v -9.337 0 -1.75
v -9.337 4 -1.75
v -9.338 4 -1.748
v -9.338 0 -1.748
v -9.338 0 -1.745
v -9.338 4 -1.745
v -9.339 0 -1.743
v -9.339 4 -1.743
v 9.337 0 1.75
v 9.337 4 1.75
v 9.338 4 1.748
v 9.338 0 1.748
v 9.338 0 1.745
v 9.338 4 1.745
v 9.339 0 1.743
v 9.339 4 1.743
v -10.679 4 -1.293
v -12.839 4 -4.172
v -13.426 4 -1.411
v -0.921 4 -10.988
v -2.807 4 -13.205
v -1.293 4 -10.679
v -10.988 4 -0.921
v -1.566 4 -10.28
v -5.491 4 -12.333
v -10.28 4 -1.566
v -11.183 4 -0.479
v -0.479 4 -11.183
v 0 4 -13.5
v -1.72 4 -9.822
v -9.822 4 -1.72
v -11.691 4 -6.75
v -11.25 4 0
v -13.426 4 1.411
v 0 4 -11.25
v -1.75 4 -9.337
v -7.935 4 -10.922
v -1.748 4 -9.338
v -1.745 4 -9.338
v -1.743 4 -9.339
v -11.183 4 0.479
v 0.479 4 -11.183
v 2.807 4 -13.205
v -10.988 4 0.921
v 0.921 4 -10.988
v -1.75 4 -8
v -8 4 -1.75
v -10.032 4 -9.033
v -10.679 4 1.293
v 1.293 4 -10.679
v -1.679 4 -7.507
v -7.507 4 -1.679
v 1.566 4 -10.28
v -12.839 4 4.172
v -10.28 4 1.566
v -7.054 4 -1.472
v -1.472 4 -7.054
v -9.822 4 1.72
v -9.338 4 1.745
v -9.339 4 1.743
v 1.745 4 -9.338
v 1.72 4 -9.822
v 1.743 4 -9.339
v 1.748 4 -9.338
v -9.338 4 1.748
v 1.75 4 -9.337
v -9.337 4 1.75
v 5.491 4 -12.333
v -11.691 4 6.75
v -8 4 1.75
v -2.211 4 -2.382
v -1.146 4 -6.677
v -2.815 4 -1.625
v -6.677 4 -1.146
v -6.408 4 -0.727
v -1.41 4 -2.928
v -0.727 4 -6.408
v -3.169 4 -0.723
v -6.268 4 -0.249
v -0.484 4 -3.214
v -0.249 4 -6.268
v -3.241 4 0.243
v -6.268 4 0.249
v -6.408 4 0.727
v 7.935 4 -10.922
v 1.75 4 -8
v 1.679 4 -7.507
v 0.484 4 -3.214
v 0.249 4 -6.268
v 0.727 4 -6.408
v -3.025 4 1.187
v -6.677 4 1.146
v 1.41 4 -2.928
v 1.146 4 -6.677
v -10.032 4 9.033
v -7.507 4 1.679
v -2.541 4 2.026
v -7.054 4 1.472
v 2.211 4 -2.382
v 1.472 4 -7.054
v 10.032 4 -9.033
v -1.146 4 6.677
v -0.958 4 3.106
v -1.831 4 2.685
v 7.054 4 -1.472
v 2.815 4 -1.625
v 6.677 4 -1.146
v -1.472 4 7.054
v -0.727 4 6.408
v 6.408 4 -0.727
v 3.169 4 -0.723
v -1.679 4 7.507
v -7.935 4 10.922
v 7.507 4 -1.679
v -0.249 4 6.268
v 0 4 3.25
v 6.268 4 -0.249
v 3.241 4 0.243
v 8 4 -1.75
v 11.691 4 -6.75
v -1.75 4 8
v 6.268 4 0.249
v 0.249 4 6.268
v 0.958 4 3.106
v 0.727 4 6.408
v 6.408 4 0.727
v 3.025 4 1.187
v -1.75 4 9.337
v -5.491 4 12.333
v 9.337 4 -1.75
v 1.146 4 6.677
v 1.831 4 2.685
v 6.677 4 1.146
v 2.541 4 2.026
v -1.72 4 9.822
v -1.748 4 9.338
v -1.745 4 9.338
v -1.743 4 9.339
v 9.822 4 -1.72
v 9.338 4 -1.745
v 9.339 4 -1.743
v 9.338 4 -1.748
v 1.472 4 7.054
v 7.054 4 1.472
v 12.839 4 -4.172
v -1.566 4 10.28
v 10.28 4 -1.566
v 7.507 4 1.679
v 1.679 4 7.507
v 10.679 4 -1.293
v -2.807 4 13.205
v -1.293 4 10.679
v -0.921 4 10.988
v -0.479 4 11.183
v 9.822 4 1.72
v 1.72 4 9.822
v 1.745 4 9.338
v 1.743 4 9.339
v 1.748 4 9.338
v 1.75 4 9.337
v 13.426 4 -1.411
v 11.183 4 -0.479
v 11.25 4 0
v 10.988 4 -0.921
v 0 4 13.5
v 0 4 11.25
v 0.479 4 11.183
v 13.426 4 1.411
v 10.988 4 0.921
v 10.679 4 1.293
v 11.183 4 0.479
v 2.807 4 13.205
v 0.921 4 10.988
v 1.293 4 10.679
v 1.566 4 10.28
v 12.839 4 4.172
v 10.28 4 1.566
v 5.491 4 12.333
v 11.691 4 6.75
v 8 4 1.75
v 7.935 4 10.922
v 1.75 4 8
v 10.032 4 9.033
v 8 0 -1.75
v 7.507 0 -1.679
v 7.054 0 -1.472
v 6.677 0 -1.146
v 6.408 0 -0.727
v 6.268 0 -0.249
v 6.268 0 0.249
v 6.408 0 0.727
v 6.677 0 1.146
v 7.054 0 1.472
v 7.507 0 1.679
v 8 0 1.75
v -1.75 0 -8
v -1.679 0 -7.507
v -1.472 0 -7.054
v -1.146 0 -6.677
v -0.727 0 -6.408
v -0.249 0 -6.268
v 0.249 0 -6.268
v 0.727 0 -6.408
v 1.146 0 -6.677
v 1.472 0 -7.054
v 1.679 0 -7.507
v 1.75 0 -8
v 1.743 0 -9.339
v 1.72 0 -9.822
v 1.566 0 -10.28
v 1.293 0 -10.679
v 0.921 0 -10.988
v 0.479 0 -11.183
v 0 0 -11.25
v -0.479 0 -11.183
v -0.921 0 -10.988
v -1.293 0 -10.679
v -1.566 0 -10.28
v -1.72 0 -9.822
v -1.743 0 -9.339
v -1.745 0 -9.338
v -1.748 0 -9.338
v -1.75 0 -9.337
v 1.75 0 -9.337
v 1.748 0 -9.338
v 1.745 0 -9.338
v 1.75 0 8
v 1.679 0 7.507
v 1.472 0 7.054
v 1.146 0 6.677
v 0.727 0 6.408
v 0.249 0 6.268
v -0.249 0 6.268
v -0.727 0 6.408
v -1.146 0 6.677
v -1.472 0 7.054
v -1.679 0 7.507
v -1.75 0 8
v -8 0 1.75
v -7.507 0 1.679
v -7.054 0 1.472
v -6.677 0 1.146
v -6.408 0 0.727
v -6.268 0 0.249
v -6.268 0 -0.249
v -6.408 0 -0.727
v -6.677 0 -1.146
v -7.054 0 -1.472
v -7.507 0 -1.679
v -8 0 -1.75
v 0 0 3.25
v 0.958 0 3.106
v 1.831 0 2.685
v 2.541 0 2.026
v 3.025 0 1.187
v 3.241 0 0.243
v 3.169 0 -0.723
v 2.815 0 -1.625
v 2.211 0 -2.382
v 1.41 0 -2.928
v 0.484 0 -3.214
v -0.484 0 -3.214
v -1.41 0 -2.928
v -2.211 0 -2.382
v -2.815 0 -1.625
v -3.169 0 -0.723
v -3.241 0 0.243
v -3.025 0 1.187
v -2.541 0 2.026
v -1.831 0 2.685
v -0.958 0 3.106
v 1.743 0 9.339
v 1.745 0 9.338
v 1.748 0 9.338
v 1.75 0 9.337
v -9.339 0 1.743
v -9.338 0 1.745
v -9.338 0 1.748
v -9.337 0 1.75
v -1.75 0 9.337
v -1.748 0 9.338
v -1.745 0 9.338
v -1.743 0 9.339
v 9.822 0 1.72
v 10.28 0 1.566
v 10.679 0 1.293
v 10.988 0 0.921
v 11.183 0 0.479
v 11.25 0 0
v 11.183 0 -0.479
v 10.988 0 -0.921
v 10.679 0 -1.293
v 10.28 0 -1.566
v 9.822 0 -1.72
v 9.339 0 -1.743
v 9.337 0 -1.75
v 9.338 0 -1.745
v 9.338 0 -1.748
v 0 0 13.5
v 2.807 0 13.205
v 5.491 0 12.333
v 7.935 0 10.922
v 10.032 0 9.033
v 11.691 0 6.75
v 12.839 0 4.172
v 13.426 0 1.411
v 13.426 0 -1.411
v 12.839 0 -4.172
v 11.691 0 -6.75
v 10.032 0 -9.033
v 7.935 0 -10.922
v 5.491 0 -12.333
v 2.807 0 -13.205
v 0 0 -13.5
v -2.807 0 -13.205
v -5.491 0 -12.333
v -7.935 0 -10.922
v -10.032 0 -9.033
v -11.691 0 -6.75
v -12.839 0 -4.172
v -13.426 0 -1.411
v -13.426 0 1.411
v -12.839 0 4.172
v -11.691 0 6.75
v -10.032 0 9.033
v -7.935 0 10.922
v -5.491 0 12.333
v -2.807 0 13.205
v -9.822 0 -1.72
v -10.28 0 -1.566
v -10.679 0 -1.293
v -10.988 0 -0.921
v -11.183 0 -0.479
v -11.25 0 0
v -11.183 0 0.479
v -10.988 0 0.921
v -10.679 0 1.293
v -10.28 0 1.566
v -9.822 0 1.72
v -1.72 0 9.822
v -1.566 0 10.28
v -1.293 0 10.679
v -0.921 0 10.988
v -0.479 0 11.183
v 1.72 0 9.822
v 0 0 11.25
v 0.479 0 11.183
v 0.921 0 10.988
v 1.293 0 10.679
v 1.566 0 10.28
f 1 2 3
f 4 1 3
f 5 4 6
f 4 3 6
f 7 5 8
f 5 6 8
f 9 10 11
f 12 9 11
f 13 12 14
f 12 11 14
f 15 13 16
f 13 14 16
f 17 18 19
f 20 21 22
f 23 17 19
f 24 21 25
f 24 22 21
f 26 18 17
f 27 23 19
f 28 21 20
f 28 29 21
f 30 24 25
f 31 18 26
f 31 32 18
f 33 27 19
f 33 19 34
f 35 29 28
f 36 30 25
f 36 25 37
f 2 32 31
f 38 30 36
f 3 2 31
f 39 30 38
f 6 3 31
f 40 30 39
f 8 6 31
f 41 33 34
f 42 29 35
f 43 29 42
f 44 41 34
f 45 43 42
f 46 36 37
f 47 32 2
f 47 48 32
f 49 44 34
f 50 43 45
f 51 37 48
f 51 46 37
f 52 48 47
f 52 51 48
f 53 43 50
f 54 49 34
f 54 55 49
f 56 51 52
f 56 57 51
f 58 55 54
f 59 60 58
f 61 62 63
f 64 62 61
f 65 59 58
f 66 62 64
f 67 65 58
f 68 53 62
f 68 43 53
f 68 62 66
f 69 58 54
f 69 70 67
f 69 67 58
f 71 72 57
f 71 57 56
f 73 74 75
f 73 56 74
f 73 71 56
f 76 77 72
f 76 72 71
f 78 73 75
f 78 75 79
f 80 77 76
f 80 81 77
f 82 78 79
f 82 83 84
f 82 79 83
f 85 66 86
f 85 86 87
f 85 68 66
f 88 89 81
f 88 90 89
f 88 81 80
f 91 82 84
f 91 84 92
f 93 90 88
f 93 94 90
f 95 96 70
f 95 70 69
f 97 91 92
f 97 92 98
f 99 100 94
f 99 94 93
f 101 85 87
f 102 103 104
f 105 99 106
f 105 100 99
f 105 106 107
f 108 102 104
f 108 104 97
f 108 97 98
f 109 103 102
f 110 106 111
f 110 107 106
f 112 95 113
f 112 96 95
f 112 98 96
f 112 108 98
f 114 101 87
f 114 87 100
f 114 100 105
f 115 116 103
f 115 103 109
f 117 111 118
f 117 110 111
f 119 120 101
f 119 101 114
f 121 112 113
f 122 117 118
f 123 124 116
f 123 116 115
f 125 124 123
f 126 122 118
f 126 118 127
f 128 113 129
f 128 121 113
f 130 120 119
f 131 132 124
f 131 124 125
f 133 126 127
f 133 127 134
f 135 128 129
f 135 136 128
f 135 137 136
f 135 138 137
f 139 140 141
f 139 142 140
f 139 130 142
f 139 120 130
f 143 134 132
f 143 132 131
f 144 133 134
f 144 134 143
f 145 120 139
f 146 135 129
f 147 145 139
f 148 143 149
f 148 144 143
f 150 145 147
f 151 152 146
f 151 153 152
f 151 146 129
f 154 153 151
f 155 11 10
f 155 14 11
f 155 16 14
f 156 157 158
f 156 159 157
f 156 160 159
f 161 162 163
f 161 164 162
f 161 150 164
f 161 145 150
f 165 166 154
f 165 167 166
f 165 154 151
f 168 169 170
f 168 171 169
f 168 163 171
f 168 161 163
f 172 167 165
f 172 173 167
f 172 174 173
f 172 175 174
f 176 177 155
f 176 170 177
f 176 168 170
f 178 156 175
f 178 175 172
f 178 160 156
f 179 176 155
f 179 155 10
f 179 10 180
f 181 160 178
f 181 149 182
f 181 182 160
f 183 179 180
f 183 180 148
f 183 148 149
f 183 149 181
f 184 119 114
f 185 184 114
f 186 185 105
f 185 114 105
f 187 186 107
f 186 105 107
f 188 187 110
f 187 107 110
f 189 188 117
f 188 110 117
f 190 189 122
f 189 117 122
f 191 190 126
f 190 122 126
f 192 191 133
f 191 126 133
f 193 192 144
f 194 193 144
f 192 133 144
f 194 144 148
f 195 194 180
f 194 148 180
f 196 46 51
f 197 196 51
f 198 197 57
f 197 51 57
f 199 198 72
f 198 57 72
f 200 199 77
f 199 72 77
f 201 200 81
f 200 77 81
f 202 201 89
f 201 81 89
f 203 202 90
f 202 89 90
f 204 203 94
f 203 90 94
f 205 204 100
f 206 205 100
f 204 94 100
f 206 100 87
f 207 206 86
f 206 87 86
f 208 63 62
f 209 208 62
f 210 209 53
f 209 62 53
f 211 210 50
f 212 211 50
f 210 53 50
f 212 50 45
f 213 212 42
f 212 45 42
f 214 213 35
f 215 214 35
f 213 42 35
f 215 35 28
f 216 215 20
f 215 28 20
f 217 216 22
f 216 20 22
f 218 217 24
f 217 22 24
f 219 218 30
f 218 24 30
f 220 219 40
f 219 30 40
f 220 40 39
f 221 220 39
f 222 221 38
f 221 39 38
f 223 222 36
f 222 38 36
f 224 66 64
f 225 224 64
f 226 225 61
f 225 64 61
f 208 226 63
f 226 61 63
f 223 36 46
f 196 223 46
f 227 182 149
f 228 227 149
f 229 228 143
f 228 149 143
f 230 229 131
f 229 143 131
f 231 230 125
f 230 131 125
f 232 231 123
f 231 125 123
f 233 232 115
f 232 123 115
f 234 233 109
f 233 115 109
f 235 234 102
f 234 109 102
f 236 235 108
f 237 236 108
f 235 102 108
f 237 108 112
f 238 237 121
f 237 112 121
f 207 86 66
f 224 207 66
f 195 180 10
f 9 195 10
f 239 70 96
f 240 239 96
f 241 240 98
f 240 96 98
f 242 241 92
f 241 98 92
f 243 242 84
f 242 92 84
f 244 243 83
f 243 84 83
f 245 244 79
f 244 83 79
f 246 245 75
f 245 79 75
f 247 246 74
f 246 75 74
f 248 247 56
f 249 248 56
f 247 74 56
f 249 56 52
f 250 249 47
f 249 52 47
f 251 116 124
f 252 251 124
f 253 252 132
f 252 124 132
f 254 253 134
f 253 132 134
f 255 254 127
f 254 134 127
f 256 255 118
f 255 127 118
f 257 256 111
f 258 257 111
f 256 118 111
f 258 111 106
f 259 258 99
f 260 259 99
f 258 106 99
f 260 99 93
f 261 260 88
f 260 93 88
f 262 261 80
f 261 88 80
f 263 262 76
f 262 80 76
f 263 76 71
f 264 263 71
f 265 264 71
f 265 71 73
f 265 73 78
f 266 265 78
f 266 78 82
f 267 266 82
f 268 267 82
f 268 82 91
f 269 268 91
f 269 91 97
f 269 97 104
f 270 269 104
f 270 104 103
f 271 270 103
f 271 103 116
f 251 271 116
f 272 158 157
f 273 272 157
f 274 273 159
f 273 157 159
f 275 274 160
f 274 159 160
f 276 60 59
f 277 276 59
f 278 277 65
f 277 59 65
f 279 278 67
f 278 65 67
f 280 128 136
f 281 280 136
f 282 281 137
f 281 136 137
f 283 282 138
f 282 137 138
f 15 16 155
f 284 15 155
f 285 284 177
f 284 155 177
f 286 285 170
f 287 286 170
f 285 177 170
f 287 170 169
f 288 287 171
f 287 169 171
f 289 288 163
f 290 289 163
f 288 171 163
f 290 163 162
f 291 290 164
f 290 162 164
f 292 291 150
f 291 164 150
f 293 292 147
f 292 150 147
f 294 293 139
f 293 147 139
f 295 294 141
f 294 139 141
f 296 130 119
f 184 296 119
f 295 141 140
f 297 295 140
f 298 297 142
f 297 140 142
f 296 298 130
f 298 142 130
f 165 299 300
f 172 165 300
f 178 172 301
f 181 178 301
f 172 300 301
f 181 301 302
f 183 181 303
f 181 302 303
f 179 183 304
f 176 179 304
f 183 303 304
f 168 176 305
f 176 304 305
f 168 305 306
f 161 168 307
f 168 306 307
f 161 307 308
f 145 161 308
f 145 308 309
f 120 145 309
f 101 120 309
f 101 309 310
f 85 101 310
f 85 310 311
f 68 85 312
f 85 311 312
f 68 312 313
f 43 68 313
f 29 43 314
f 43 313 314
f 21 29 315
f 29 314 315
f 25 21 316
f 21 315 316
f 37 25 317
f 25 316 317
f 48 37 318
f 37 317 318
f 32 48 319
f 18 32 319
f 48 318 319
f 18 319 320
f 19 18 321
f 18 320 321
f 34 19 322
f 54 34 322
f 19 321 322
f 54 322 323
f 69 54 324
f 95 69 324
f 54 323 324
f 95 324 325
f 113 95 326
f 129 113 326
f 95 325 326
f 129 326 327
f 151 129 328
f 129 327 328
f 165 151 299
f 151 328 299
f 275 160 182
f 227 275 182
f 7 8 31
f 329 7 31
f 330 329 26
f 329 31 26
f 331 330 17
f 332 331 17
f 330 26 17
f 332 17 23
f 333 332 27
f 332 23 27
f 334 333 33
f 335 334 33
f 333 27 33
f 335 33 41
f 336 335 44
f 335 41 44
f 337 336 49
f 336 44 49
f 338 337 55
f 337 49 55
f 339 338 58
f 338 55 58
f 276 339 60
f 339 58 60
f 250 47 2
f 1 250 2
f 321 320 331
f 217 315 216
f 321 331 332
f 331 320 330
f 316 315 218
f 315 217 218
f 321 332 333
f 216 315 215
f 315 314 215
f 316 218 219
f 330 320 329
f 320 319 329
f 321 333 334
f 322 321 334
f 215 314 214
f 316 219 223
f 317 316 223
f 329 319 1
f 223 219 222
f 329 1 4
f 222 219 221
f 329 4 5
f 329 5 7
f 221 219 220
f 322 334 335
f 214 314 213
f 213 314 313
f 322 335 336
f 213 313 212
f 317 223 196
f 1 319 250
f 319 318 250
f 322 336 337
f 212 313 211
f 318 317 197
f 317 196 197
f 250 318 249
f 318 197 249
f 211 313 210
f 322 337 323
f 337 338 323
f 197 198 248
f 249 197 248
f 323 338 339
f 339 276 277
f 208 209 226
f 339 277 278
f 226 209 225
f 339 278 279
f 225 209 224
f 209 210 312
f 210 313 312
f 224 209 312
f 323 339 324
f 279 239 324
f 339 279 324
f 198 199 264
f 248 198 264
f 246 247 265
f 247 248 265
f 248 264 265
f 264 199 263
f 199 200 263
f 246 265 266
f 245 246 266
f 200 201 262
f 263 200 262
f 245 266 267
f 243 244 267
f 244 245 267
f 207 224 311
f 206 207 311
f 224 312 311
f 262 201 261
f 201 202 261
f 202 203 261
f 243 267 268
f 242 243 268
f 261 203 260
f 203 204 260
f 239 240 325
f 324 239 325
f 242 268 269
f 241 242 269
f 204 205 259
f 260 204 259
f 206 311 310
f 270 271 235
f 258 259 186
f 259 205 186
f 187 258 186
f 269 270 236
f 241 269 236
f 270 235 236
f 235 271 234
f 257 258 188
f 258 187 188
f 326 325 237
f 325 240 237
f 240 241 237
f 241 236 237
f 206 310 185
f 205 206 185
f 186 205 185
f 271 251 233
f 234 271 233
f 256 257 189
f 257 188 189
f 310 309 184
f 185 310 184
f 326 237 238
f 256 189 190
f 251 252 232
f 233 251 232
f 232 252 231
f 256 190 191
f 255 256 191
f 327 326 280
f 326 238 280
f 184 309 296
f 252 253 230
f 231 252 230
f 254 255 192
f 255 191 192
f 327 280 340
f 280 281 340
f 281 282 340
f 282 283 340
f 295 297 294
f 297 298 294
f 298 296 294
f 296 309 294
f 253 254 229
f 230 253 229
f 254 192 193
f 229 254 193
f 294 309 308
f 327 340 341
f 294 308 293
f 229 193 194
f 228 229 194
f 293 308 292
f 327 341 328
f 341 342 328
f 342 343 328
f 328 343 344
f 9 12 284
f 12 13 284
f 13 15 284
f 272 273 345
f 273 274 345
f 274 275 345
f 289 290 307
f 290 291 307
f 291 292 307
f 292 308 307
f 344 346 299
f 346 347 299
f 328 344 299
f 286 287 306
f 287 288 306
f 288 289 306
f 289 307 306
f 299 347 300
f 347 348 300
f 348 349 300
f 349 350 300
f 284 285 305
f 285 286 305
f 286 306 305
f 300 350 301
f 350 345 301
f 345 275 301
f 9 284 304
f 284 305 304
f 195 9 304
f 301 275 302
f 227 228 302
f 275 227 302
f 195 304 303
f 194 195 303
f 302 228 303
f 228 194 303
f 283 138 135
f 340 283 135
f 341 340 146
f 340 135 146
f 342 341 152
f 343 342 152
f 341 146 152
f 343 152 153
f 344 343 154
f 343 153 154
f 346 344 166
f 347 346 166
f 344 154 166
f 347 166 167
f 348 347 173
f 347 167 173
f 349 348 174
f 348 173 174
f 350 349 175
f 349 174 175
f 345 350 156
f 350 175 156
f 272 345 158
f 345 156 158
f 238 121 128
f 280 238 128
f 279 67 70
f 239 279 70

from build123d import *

# Parameters (mm, degrees)
SKETCH1_R           = 13.5
BOSS_EXTRUDE1_DEPTH = 4
CUT_EXTRUDE1_REACH  = 21.506
SKETCH2_R           = 3.25


with BuildPart() as part:
    # Sketch1 → Boss-Extrude1 (new body)
    with BuildSketch(Plane(origin=(0, 0, 0), x_dir=(1, 0, 0), z_dir=(0, 1, 0))):
        with Locations(Location((0, 0, 0), (0, 0, 270))):
            Circle(SKETCH1_R)
    extrude(amount=BOSS_EXTRUDE1_DEPTH)

    # Sketch2 → Cut-Extrude1 (cut, up to next)
    with BuildSketch(Plane(origin=(0, 4, 0), x_dir=(1, 0, 0), z_dir=(0, 1, 0)), mode=Mode.PRIVATE) as cut_extrude1_sk1:
        with BuildLine():
            Line((-9.337424698, -1.75), (-8, -1.75))
            ThreePointArc((-8, -1.75), (-6.25, 0), (-8, 1.75))
            Line((-8, 1.75), (-9.337424698, 1.75))
            ThreePointArc((-9.337424698, 1.75), (-9.338120985, 1.746280755), (-9.338815789, 1.742561233))
            ThreePointArc((-9.338815789, 1.742561233), (-11.25, 0), (-9.338815789, -1.742561233))
            ThreePointArc((-9.338815789, -1.742561233), (-9.338120985, -1.746280755), (-9.337424698, -1.75))
        make_face()
    cut_extrude1_tool1 = extrude(cut_extrude1_sk1.sketch, amount=-CUT_EXTRUDE1_REACH, mode=Mode.PRIVATE) & part.part
    # Sketch2 → Cut-Extrude1 (cut, up to next)
    with BuildSketch(Plane(origin=(0, 4, 0), x_dir=(1, 0, 0), z_dir=(0, 1, 0)), mode=Mode.PRIVATE) as cut_extrude1_sk2:
        with BuildLine():
            ThreePointArc((1.75, 9.337424698), (1.746280755, 9.338120985), (1.742561233, 9.338815789))
            ThreePointArc((1.742561233, 9.338815789), (0, 11.25), (-1.742561233, 9.338815789))
            ThreePointArc((-1.742561233, 9.338815789), (-1.746280755, 9.338120985), (-1.75, 9.337424698))
            Line((-1.75, 9.337424698), (-1.75, 8))
            ThreePointArc((-1.75, 8), (0, 6.25), (1.75, 8))
            Line((1.75, 8), (1.75, 9.337424698))
        make_face()
    cut_extrude1_tool2 = extrude(cut_extrude1_sk2.sketch, amount=-CUT_EXTRUDE1_REACH, mode=Mode.PRIVATE) & part.part
    # Sketch2 → Cut-Extrude1 (cut, up to next)
    with BuildSketch(Plane(origin=(0, 4, 0), x_dir=(1, 0, 0), z_dir=(0, 1, 0)), mode=Mode.PRIVATE) as cut_extrude1_sk3:
        with BuildLine():
            ThreePointArc((-1.742561233, -9.338815789), (0, -11.25), (1.742561233, -9.338815789))
            ThreePointArc((1.742561233, -9.338815789), (1.746280755, -9.338120985), (1.75, -9.337424698))
            Line((1.75, -9.337424698), (1.75, -8))
            ThreePointArc((1.75, -8), (0, -6.25), (-1.75, -8))
            Line((-1.75, -8), (-1.75, -9.337424698))
            ThreePointArc((-1.75, -9.337424698), (-1.746280755, -9.338120985), (-1.742561233, -9.338815789))
        make_face()
    cut_extrude1_tool3 = extrude(cut_extrude1_sk3.sketch, amount=-CUT_EXTRUDE1_REACH, mode=Mode.PRIVATE) & part.part
    # Sketch2 → Cut-Extrude1 (cut, up to next)
    with BuildSketch(Plane(origin=(0, 4, 0), x_dir=(1, 0, 0), z_dir=(0, 1, 0)), mode=Mode.PRIVATE) as cut_extrude1_sk4:
        with BuildLine():
            ThreePointArc((9.337424698, -1.75), (9.338120985, -1.746280755), (9.338815789, -1.742561233))
            ThreePointArc((9.338815789, -1.742561233), (11.25, 0), (9.338815789, 1.742561233))
            ThreePointArc((9.338815789, 1.742561233), (9.338120985, 1.746280755), (9.337424698, 1.75))
            Line((9.337424698, 1.75), (8, 1.75))
            ThreePointArc((8, 1.75), (6.25, 0), (8, -1.75))
            Line((8, -1.75), (9.337424698, -1.75))
        make_face()
    cut_extrude1_tool4 = extrude(cut_extrude1_sk4.sketch, amount=-CUT_EXTRUDE1_REACH, mode=Mode.PRIVATE) & part.part
    # Sketch2 → Cut-Extrude1 (cut, up to next)
    with BuildSketch(Plane(origin=(0, 4, 0), x_dir=(1, 0, 0), z_dir=(0, 1, 0)), mode=Mode.PRIVATE) as cut_extrude1_sk5:
        with Locations(Location((0, 0, 0), (0, 0, 270))):
            Circle(SKETCH2_R)
    cut_extrude1_tool5 = extrude(cut_extrude1_sk5.sketch, amount=-CUT_EXTRUDE1_REACH, mode=Mode.PRIVATE) & part.part
    add(cut_extrude1_tool1.solids().sort_by_distance((-8.749966, 4, 0))[0], mode=Mode.SUBTRACT)
    add(cut_extrude1_tool2.solids().sort_by_distance((0, 4, -8.749966))[0], mode=Mode.SUBTRACT)
    add(cut_extrude1_tool3.solids().sort_by_distance((0, 4, 8.749966))[0], mode=Mode.SUBTRACT)
    add(cut_extrude1_tool4.solids().sort_by_distance((8.749966, 4, 0))[0], mode=Mode.SUBTRACT)
    add(cut_extrude1_tool5.solids().sort_by_distance((0, 4, 0))[0], mode=Mode.SUBTRACT)


solid = part.part
